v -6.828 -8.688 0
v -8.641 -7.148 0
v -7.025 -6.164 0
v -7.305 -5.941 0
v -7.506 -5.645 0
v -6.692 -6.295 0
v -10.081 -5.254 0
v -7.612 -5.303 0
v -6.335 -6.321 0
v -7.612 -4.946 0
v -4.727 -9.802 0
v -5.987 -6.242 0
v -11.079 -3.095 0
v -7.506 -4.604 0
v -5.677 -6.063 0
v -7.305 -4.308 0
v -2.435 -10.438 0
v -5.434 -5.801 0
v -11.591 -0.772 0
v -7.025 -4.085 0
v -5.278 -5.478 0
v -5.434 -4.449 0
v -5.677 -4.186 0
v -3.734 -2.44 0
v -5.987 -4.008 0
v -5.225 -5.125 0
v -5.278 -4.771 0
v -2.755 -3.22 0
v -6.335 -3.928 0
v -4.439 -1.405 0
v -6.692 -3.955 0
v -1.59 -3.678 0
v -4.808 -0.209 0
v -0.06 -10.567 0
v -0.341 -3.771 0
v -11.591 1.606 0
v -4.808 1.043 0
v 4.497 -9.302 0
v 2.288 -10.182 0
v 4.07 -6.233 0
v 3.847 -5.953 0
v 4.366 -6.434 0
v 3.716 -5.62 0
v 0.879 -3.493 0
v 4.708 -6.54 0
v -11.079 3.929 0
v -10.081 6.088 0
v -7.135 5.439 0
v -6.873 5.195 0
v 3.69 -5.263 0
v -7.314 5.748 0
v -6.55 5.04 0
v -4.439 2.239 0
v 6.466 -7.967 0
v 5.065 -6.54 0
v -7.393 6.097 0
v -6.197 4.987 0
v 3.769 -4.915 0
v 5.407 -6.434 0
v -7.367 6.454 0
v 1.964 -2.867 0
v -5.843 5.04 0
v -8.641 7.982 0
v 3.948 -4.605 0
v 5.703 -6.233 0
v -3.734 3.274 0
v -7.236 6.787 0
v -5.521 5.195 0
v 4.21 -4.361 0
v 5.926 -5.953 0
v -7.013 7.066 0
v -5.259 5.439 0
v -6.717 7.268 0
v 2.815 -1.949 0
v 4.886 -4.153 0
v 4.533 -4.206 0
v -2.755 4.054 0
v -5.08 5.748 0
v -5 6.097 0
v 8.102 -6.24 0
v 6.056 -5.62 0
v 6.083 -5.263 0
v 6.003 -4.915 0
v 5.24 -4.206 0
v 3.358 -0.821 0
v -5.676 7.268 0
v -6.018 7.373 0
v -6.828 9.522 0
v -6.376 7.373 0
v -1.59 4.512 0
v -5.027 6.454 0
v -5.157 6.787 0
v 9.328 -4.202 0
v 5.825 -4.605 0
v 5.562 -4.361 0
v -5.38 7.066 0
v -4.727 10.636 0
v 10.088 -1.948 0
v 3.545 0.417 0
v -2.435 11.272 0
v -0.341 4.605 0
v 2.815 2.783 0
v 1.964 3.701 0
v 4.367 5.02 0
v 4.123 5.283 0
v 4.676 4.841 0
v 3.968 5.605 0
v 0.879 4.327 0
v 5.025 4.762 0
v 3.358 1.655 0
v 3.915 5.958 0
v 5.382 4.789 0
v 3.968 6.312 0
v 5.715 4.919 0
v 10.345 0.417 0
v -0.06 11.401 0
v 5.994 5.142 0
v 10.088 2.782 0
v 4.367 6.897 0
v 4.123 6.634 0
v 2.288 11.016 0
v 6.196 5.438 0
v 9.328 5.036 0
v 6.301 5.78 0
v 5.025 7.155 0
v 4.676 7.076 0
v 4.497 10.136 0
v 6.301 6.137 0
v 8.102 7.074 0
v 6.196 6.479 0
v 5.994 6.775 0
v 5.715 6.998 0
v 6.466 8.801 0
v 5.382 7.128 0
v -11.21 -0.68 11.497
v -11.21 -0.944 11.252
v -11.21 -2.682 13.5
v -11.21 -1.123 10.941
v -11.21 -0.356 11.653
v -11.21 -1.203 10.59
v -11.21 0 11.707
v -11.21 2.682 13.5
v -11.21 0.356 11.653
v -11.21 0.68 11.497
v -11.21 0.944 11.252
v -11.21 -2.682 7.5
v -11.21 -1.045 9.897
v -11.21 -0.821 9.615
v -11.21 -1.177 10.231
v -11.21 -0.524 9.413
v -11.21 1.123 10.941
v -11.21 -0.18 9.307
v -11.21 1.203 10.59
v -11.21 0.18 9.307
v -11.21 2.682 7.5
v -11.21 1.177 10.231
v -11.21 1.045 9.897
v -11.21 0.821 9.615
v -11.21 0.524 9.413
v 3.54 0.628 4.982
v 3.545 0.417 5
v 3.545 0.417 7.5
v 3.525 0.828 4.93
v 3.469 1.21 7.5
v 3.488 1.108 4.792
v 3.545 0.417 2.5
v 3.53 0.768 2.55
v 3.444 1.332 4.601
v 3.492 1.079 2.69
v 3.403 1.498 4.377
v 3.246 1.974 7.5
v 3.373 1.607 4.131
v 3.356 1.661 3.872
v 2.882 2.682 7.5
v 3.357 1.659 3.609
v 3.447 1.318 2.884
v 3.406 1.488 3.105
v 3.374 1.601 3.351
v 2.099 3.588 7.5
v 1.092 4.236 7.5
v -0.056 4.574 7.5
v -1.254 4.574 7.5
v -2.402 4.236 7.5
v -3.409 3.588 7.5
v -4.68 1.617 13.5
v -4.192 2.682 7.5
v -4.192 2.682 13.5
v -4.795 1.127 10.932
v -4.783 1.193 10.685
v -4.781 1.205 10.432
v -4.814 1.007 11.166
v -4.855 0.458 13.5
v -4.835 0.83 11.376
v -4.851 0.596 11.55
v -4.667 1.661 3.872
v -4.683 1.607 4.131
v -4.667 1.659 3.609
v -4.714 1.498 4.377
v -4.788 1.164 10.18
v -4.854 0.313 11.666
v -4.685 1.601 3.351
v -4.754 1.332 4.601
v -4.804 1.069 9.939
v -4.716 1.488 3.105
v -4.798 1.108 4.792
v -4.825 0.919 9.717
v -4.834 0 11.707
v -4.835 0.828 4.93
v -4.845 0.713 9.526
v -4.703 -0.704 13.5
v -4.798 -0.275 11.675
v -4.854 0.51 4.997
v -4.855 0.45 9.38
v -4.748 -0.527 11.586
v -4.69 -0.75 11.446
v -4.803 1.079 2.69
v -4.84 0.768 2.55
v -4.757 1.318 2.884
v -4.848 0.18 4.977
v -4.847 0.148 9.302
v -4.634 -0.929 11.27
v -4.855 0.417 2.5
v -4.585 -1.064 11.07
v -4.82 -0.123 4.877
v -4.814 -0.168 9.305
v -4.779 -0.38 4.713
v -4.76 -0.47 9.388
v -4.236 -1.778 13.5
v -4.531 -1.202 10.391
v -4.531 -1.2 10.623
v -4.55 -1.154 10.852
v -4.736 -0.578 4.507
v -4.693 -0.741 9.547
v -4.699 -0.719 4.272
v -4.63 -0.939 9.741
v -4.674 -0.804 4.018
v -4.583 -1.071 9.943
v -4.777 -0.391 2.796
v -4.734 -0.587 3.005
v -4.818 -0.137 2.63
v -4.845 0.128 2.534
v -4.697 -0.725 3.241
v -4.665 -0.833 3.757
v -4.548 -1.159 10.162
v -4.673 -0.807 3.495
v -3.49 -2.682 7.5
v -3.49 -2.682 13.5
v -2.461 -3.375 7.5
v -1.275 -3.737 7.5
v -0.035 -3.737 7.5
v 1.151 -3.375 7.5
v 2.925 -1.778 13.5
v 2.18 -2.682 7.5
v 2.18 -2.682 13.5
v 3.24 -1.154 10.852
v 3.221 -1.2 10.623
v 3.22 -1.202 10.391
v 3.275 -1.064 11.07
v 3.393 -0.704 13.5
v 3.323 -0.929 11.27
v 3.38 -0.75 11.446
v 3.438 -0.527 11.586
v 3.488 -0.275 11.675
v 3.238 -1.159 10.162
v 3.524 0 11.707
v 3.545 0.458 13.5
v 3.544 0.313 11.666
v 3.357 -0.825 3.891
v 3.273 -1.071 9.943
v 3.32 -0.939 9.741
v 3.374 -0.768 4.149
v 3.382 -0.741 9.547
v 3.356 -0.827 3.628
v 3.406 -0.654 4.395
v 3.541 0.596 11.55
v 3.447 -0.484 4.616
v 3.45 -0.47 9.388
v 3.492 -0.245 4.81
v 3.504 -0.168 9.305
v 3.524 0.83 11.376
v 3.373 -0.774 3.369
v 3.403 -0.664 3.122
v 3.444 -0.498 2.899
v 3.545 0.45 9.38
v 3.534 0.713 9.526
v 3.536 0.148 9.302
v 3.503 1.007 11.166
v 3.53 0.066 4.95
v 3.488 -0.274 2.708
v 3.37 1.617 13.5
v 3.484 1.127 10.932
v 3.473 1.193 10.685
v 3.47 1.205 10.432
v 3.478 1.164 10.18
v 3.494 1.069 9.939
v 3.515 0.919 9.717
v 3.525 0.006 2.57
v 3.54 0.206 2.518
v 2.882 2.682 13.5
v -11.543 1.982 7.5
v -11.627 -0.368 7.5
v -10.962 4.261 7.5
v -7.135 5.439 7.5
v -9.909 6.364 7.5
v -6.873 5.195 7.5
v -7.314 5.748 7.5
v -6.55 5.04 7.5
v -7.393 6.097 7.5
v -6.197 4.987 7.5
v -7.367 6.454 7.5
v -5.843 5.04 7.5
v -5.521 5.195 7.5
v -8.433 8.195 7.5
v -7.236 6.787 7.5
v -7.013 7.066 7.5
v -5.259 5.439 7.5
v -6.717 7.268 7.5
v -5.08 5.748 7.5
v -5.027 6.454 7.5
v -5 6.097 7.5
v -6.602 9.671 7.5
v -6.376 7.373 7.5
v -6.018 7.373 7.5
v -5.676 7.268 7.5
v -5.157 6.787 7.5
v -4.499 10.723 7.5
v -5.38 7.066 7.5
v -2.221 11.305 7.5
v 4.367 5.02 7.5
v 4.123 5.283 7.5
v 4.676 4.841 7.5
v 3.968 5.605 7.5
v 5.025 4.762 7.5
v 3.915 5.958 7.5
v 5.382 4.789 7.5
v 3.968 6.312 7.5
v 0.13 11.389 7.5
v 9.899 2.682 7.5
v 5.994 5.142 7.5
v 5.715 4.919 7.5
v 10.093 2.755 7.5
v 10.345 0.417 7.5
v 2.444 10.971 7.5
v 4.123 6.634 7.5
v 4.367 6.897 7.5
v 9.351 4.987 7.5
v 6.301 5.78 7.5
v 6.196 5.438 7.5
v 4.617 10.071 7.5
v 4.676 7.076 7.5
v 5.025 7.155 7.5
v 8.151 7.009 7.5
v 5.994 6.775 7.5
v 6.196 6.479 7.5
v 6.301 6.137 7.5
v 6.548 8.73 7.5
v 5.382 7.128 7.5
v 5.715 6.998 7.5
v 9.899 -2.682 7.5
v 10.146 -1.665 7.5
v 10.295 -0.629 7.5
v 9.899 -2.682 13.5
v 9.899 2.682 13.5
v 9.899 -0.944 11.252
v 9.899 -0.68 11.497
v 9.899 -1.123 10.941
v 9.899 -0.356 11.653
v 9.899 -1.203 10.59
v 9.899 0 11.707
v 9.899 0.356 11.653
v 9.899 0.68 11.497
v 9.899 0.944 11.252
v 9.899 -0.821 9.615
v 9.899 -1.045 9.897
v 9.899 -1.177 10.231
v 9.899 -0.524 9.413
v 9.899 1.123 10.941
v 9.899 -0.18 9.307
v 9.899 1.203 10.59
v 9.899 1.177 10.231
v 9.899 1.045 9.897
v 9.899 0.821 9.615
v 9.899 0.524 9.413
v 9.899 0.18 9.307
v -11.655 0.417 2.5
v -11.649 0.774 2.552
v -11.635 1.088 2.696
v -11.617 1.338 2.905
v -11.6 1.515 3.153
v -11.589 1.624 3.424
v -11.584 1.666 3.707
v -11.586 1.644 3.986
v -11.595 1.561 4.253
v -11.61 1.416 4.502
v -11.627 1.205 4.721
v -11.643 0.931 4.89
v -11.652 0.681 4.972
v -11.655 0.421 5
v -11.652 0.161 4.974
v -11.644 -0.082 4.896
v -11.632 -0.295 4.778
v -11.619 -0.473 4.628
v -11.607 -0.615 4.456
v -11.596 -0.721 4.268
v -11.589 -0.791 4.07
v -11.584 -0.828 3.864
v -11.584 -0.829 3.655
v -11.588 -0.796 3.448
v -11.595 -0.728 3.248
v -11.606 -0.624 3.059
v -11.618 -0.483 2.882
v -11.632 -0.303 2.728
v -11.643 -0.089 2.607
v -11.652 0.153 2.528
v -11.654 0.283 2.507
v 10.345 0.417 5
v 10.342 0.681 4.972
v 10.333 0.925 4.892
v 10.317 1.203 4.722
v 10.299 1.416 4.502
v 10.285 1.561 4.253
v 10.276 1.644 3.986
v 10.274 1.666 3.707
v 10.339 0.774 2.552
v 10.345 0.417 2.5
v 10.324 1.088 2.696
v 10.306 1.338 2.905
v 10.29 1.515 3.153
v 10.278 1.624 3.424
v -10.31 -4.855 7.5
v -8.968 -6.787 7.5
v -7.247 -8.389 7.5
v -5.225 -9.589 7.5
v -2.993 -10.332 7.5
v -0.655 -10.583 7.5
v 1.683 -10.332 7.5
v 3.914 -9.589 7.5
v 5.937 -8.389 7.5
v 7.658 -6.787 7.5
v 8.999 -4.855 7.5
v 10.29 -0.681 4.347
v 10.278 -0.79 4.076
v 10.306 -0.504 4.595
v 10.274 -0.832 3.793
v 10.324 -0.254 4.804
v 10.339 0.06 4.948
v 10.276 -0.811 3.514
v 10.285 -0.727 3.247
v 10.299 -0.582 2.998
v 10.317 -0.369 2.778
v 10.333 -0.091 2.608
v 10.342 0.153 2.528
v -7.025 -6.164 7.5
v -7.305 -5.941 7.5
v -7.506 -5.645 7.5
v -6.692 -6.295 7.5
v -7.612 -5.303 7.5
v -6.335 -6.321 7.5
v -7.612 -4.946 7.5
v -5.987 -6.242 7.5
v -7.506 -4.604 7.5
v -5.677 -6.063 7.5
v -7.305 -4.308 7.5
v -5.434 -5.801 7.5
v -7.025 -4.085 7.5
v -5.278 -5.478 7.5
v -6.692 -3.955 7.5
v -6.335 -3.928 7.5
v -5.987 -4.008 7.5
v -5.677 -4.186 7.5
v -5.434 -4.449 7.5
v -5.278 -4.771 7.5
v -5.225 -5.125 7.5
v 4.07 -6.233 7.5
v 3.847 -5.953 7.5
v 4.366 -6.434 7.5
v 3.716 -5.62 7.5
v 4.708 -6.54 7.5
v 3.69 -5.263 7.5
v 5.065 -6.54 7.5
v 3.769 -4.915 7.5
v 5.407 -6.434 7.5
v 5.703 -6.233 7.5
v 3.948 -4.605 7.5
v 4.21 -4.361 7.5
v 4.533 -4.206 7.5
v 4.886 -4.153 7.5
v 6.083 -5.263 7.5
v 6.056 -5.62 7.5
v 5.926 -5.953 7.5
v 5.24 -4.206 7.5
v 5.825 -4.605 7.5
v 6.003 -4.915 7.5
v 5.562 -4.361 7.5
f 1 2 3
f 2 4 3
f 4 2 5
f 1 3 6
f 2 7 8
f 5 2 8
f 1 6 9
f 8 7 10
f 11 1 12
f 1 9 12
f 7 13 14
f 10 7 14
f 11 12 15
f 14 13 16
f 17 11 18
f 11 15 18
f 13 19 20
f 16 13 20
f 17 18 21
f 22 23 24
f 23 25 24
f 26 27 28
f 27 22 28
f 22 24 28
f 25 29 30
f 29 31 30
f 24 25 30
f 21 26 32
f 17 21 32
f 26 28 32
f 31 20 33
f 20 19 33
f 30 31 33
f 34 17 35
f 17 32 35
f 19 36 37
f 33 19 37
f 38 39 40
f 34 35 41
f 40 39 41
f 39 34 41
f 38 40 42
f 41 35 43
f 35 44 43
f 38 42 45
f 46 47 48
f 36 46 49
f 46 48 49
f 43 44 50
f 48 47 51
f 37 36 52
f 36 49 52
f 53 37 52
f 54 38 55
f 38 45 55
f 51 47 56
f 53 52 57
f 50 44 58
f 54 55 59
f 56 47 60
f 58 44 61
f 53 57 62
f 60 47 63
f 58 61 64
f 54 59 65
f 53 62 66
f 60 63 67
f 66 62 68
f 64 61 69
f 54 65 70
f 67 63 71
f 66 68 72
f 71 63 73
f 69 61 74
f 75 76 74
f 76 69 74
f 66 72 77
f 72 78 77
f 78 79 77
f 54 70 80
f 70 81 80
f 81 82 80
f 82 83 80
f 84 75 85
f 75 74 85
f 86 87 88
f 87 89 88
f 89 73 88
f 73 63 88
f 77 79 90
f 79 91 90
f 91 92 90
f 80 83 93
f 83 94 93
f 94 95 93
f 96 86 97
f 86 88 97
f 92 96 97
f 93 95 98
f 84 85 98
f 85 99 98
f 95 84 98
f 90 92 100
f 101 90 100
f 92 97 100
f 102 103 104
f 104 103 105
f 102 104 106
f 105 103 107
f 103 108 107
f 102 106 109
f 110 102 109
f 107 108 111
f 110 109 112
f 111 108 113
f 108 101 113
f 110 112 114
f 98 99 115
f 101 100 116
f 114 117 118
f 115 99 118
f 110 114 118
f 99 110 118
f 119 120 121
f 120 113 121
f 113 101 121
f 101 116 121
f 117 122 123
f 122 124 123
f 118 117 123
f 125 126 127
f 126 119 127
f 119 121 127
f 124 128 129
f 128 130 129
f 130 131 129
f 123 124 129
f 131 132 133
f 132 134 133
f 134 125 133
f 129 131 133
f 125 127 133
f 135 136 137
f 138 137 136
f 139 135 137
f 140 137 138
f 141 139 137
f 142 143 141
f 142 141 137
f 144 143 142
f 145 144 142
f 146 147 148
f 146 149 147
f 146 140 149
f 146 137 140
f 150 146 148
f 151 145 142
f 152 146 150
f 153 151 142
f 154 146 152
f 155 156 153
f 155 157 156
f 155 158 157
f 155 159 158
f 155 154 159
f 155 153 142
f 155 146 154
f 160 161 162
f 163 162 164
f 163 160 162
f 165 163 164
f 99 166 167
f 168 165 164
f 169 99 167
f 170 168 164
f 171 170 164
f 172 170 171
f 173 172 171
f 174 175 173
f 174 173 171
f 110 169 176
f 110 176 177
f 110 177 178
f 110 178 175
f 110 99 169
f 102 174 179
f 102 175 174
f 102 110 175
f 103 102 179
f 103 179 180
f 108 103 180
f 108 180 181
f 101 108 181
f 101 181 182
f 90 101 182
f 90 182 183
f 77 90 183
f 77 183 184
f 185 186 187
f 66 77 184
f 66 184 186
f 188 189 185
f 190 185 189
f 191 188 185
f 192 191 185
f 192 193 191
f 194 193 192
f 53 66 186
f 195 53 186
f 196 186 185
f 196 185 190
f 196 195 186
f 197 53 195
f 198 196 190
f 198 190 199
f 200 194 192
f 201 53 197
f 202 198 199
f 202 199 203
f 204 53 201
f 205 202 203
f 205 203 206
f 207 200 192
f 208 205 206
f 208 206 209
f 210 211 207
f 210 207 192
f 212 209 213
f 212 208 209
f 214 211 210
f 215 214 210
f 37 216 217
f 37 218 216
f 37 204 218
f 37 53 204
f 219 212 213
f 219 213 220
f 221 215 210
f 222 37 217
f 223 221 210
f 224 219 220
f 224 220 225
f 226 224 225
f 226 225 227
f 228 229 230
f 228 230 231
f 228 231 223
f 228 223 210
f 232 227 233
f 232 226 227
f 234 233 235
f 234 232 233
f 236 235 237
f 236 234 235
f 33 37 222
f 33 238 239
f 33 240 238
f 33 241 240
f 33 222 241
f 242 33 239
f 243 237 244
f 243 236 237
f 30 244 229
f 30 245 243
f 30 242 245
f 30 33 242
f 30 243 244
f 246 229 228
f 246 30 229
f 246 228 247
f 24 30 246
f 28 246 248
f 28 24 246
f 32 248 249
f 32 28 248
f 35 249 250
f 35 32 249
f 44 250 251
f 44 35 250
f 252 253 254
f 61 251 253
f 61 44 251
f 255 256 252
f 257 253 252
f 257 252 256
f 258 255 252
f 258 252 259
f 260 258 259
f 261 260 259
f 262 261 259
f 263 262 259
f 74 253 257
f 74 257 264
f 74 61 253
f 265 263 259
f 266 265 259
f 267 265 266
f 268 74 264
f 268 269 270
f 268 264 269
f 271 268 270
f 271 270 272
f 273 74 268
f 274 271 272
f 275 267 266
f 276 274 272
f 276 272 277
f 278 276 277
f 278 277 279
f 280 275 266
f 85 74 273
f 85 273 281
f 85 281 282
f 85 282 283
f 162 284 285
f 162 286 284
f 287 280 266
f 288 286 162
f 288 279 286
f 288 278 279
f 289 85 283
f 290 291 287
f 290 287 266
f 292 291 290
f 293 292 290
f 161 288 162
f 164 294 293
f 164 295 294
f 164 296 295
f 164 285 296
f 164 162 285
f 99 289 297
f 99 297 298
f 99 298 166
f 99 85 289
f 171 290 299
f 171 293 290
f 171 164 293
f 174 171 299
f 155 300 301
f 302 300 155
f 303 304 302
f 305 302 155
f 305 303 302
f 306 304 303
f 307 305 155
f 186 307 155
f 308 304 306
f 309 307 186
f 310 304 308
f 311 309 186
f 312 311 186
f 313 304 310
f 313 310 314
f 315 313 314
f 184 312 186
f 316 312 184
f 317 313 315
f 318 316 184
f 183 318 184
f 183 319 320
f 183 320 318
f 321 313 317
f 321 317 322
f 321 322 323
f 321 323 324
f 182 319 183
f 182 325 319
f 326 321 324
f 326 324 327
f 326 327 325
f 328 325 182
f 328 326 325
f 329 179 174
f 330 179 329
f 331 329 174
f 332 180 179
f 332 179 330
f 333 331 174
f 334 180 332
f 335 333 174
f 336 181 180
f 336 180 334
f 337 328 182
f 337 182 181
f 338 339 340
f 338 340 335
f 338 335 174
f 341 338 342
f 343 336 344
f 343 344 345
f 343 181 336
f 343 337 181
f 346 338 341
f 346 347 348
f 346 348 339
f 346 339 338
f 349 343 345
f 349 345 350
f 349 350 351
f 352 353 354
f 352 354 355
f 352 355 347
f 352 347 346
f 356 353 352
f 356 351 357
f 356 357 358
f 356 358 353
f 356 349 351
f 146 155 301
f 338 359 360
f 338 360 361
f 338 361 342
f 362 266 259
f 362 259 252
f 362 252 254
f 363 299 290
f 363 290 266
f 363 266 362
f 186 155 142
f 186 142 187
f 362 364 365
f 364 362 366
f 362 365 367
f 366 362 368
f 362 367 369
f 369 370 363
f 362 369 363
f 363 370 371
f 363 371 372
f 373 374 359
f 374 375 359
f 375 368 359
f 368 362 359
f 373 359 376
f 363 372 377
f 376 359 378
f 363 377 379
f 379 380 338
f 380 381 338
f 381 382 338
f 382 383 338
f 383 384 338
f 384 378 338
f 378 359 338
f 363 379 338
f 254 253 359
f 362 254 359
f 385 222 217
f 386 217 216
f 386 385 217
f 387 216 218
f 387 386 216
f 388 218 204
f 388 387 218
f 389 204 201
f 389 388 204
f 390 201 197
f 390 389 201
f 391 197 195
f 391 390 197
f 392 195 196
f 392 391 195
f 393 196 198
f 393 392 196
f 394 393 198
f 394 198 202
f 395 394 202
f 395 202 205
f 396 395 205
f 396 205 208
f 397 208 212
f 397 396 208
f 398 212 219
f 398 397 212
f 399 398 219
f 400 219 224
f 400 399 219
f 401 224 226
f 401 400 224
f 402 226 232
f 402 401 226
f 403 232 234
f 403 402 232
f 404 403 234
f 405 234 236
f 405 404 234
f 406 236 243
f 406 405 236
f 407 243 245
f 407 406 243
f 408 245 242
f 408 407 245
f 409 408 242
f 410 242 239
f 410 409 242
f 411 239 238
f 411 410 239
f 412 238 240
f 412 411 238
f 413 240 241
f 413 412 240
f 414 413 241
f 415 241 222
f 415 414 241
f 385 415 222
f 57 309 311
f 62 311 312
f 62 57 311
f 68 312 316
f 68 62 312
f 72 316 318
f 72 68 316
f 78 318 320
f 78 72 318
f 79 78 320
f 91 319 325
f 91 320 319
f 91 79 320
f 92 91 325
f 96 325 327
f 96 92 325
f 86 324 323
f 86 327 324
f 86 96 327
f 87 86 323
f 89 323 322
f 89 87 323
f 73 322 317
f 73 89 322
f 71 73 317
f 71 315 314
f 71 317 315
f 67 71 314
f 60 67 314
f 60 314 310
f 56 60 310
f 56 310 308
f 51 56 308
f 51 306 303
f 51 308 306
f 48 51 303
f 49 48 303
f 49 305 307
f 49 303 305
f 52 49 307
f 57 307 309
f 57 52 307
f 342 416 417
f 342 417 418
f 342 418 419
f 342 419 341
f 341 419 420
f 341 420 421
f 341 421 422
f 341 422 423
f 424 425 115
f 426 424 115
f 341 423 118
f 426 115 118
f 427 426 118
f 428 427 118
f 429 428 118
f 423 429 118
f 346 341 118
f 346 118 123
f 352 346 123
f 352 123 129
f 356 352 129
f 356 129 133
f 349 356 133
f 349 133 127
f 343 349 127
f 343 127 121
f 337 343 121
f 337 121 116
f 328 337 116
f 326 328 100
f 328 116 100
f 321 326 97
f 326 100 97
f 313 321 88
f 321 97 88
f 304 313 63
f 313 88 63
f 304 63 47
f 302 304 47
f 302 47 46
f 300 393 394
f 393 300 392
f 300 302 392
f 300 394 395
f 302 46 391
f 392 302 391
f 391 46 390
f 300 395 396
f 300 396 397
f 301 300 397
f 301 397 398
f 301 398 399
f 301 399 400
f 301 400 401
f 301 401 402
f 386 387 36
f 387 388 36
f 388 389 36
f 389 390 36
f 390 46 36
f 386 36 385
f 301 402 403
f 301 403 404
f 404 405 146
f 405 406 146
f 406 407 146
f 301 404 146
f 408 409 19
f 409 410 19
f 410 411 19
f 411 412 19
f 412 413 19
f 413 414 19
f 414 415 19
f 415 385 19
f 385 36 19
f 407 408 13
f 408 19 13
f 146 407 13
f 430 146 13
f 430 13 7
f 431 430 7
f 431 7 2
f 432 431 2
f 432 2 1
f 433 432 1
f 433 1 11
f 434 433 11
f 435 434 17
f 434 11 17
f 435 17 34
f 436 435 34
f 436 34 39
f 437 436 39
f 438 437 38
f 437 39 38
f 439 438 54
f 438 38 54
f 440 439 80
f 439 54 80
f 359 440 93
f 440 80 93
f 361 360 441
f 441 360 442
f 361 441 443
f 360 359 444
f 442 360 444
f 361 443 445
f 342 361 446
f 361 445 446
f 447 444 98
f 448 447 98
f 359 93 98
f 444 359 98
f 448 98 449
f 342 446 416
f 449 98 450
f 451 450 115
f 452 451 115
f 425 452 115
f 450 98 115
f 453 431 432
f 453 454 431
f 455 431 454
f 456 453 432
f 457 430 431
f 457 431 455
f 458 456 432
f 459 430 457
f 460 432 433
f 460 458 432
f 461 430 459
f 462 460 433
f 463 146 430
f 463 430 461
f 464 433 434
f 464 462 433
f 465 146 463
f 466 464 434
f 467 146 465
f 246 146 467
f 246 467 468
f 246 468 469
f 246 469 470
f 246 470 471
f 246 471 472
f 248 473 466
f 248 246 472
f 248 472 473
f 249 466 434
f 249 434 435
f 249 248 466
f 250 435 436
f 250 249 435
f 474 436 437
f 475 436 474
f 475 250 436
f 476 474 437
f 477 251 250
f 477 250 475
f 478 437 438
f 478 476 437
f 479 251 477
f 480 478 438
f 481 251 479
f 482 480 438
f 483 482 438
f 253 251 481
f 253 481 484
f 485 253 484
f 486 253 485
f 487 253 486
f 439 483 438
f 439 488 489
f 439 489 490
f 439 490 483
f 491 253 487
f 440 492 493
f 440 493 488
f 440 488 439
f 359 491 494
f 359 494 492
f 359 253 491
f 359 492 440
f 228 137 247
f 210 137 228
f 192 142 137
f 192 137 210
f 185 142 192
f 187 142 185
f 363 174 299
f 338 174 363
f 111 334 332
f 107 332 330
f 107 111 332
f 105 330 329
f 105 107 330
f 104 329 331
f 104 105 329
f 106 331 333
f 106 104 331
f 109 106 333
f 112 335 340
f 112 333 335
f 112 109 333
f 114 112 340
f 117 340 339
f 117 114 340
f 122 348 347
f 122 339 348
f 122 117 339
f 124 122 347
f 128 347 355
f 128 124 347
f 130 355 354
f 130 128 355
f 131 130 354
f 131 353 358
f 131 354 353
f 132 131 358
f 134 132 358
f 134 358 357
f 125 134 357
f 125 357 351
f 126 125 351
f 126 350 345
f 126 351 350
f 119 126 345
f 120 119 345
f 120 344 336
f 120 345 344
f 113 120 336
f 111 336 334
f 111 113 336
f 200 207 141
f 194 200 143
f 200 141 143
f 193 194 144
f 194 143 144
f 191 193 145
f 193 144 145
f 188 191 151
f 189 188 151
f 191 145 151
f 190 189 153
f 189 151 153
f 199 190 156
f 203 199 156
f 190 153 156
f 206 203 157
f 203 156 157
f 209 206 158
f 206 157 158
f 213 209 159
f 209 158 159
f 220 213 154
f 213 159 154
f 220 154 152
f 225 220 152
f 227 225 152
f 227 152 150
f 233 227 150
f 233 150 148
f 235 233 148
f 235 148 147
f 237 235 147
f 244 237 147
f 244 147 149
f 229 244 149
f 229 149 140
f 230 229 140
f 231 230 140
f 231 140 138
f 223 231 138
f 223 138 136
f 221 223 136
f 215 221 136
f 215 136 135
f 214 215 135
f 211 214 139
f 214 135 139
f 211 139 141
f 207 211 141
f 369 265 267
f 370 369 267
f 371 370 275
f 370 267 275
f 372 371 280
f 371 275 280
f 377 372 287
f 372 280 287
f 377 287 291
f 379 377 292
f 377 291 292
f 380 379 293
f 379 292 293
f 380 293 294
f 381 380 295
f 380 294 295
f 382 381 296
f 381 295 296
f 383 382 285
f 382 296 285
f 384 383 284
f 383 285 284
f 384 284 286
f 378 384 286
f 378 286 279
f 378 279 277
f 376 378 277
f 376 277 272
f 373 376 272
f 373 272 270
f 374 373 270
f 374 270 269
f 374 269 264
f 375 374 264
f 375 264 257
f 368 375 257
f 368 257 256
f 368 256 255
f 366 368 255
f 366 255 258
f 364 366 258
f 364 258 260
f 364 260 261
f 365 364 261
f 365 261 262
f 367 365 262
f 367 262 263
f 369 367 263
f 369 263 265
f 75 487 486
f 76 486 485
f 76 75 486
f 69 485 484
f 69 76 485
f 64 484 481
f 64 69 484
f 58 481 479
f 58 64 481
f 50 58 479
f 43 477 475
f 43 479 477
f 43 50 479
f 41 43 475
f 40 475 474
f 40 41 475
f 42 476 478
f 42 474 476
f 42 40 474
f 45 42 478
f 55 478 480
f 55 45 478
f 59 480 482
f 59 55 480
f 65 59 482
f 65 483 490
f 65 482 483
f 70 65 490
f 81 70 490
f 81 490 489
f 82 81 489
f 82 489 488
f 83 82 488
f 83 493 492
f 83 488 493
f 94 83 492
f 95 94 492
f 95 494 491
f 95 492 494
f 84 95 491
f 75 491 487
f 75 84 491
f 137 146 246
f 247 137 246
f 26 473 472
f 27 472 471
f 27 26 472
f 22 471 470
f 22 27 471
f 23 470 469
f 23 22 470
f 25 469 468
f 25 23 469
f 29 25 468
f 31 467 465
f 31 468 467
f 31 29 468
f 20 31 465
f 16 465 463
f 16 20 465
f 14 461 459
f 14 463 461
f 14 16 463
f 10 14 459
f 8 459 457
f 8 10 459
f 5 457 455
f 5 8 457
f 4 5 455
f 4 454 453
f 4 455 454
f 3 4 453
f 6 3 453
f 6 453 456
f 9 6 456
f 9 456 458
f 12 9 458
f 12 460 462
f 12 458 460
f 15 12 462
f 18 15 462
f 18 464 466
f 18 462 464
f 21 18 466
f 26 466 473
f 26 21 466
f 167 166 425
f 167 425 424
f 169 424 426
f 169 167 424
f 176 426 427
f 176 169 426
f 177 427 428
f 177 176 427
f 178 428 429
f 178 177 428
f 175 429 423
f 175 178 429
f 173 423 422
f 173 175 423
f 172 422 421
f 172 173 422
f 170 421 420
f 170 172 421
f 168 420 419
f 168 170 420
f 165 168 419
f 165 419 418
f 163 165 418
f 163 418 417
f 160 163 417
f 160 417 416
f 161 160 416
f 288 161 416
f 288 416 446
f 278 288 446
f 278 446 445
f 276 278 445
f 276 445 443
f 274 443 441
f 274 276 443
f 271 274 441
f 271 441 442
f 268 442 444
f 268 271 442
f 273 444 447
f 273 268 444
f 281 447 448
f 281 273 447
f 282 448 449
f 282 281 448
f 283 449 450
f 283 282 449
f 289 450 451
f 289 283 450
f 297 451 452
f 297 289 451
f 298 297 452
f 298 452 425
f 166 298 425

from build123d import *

# Parameters (mm, degrees)
SKETCH1_R               = 11
SKETCH1_R_2             = 4.2
BOSS_EXTRUDE1_DEPTH     = 7.5
CUT_EXTRUDE1_DEPTH      = 18.956588045
CUT_EXTRUDE1_DEPTH_BACK = 18.956588045
SKETCH2_R               = 1.25
SKETCH1_4_R             = 1.2
CUT_EXTRUDE3_DEPTH      = 18.956588216
CIRPATTERN2_COUNT       = 4
SKETCH3_W               = 21.108856579
SKETCH3_H               = 5.364192866
BOSS_EXTRUDE2_DEPTH     = 6
SKETCH4_R               = 1.20682121
CUT_EXTRUDE4_DEPTH      = 28.878127015
SKETCH1_5_R             = 4.2
CUT_EXTRUDE5_DEPTH      = 22.176379739


with BuildPart() as part:
    # Sketch1 → Boss-Extrude1 (new body)
    with BuildSketch(Plane.XY):
        with Locations((-0.655147954, 0.416942691)):
            Circle(SKETCH1_R)
        with Locations((-0.655147954, 0.416942691)):
            Circle(SKETCH1_R_2, mode=Mode.SUBTRACT)
    extrude(amount=BOSS_EXTRUDE1_DEPTH)

    # Sketch2 → Cut-Extrude1 (cut, two sides: drawn at the far end of the back side and taken through both)
    with BuildSketch(Plane(origin=(0, 0, 0), x_dir=(0, 0, -1), z_dir=(1, 0, 0)).offset(-CUT_EXTRUDE1_DEPTH_BACK)):
        with Locations((-3.75, 0.416942691)):
            Circle(SKETCH2_R)
    extrude(amount=CUT_EXTRUDE1_DEPTH + CUT_EXTRUDE1_DEPTH_BACK, mode=Mode.SUBTRACT)

    # Sketch1<4> → Cut-Extrude3 (cut, through all)
    with BuildSketch(Plane.XY):
        with Locations((-6.42500216, -5.124607853)):
            Circle(SKETCH1_4_R)
    cut_extrude3 = extrude(amount=CUT_EXTRUDE3_DEPTH, mode=Mode.SUBTRACT)

    # CirPattern2: Cut-Extrude3 ×4 about axis
    cirpattern2_axis = Axis((-0.655147954, 0.416942691, 7.5), (0, 0, 1))
    for i in range(1, CIRPATTERN2_COUNT):
        add(cut_extrude3.rotate(cirpattern2_axis, i * 360 / CIRPATTERN2_COUNT), mode=Mode.SUBTRACT)

    # Sketch3 → Boss-Extrude2 (add)
    with BuildSketch(Plane.XY.offset(7.5)):
        with Locations((-0.655147954, 0)):
            Rectangle(SKETCH3_W, SKETCH3_H)
    extrude(amount=BOSS_EXTRUDE2_DEPTH)

    # Sketch4 → Cut-Extrude4 (cut, through all)
    with BuildSketch(Plane.ZY.offset(11.209576243)):
        with Locations((10.5, 0)):
            Circle(SKETCH4_R)
    extrude(amount=-CUT_EXTRUDE4_DEPTH, mode=Mode.SUBTRACT)

    # Sketch1<5> → Cut-Extrude5 (cut, through all)
    with BuildSketch(Plane.XY):
        with Locations((-0.655147954, 0.416942691)):
            Circle(SKETCH1_5_R)
    extrude(amount=CUT_EXTRUDE5_DEPTH, mode=Mode.SUBTRACT)


solid = part.part
